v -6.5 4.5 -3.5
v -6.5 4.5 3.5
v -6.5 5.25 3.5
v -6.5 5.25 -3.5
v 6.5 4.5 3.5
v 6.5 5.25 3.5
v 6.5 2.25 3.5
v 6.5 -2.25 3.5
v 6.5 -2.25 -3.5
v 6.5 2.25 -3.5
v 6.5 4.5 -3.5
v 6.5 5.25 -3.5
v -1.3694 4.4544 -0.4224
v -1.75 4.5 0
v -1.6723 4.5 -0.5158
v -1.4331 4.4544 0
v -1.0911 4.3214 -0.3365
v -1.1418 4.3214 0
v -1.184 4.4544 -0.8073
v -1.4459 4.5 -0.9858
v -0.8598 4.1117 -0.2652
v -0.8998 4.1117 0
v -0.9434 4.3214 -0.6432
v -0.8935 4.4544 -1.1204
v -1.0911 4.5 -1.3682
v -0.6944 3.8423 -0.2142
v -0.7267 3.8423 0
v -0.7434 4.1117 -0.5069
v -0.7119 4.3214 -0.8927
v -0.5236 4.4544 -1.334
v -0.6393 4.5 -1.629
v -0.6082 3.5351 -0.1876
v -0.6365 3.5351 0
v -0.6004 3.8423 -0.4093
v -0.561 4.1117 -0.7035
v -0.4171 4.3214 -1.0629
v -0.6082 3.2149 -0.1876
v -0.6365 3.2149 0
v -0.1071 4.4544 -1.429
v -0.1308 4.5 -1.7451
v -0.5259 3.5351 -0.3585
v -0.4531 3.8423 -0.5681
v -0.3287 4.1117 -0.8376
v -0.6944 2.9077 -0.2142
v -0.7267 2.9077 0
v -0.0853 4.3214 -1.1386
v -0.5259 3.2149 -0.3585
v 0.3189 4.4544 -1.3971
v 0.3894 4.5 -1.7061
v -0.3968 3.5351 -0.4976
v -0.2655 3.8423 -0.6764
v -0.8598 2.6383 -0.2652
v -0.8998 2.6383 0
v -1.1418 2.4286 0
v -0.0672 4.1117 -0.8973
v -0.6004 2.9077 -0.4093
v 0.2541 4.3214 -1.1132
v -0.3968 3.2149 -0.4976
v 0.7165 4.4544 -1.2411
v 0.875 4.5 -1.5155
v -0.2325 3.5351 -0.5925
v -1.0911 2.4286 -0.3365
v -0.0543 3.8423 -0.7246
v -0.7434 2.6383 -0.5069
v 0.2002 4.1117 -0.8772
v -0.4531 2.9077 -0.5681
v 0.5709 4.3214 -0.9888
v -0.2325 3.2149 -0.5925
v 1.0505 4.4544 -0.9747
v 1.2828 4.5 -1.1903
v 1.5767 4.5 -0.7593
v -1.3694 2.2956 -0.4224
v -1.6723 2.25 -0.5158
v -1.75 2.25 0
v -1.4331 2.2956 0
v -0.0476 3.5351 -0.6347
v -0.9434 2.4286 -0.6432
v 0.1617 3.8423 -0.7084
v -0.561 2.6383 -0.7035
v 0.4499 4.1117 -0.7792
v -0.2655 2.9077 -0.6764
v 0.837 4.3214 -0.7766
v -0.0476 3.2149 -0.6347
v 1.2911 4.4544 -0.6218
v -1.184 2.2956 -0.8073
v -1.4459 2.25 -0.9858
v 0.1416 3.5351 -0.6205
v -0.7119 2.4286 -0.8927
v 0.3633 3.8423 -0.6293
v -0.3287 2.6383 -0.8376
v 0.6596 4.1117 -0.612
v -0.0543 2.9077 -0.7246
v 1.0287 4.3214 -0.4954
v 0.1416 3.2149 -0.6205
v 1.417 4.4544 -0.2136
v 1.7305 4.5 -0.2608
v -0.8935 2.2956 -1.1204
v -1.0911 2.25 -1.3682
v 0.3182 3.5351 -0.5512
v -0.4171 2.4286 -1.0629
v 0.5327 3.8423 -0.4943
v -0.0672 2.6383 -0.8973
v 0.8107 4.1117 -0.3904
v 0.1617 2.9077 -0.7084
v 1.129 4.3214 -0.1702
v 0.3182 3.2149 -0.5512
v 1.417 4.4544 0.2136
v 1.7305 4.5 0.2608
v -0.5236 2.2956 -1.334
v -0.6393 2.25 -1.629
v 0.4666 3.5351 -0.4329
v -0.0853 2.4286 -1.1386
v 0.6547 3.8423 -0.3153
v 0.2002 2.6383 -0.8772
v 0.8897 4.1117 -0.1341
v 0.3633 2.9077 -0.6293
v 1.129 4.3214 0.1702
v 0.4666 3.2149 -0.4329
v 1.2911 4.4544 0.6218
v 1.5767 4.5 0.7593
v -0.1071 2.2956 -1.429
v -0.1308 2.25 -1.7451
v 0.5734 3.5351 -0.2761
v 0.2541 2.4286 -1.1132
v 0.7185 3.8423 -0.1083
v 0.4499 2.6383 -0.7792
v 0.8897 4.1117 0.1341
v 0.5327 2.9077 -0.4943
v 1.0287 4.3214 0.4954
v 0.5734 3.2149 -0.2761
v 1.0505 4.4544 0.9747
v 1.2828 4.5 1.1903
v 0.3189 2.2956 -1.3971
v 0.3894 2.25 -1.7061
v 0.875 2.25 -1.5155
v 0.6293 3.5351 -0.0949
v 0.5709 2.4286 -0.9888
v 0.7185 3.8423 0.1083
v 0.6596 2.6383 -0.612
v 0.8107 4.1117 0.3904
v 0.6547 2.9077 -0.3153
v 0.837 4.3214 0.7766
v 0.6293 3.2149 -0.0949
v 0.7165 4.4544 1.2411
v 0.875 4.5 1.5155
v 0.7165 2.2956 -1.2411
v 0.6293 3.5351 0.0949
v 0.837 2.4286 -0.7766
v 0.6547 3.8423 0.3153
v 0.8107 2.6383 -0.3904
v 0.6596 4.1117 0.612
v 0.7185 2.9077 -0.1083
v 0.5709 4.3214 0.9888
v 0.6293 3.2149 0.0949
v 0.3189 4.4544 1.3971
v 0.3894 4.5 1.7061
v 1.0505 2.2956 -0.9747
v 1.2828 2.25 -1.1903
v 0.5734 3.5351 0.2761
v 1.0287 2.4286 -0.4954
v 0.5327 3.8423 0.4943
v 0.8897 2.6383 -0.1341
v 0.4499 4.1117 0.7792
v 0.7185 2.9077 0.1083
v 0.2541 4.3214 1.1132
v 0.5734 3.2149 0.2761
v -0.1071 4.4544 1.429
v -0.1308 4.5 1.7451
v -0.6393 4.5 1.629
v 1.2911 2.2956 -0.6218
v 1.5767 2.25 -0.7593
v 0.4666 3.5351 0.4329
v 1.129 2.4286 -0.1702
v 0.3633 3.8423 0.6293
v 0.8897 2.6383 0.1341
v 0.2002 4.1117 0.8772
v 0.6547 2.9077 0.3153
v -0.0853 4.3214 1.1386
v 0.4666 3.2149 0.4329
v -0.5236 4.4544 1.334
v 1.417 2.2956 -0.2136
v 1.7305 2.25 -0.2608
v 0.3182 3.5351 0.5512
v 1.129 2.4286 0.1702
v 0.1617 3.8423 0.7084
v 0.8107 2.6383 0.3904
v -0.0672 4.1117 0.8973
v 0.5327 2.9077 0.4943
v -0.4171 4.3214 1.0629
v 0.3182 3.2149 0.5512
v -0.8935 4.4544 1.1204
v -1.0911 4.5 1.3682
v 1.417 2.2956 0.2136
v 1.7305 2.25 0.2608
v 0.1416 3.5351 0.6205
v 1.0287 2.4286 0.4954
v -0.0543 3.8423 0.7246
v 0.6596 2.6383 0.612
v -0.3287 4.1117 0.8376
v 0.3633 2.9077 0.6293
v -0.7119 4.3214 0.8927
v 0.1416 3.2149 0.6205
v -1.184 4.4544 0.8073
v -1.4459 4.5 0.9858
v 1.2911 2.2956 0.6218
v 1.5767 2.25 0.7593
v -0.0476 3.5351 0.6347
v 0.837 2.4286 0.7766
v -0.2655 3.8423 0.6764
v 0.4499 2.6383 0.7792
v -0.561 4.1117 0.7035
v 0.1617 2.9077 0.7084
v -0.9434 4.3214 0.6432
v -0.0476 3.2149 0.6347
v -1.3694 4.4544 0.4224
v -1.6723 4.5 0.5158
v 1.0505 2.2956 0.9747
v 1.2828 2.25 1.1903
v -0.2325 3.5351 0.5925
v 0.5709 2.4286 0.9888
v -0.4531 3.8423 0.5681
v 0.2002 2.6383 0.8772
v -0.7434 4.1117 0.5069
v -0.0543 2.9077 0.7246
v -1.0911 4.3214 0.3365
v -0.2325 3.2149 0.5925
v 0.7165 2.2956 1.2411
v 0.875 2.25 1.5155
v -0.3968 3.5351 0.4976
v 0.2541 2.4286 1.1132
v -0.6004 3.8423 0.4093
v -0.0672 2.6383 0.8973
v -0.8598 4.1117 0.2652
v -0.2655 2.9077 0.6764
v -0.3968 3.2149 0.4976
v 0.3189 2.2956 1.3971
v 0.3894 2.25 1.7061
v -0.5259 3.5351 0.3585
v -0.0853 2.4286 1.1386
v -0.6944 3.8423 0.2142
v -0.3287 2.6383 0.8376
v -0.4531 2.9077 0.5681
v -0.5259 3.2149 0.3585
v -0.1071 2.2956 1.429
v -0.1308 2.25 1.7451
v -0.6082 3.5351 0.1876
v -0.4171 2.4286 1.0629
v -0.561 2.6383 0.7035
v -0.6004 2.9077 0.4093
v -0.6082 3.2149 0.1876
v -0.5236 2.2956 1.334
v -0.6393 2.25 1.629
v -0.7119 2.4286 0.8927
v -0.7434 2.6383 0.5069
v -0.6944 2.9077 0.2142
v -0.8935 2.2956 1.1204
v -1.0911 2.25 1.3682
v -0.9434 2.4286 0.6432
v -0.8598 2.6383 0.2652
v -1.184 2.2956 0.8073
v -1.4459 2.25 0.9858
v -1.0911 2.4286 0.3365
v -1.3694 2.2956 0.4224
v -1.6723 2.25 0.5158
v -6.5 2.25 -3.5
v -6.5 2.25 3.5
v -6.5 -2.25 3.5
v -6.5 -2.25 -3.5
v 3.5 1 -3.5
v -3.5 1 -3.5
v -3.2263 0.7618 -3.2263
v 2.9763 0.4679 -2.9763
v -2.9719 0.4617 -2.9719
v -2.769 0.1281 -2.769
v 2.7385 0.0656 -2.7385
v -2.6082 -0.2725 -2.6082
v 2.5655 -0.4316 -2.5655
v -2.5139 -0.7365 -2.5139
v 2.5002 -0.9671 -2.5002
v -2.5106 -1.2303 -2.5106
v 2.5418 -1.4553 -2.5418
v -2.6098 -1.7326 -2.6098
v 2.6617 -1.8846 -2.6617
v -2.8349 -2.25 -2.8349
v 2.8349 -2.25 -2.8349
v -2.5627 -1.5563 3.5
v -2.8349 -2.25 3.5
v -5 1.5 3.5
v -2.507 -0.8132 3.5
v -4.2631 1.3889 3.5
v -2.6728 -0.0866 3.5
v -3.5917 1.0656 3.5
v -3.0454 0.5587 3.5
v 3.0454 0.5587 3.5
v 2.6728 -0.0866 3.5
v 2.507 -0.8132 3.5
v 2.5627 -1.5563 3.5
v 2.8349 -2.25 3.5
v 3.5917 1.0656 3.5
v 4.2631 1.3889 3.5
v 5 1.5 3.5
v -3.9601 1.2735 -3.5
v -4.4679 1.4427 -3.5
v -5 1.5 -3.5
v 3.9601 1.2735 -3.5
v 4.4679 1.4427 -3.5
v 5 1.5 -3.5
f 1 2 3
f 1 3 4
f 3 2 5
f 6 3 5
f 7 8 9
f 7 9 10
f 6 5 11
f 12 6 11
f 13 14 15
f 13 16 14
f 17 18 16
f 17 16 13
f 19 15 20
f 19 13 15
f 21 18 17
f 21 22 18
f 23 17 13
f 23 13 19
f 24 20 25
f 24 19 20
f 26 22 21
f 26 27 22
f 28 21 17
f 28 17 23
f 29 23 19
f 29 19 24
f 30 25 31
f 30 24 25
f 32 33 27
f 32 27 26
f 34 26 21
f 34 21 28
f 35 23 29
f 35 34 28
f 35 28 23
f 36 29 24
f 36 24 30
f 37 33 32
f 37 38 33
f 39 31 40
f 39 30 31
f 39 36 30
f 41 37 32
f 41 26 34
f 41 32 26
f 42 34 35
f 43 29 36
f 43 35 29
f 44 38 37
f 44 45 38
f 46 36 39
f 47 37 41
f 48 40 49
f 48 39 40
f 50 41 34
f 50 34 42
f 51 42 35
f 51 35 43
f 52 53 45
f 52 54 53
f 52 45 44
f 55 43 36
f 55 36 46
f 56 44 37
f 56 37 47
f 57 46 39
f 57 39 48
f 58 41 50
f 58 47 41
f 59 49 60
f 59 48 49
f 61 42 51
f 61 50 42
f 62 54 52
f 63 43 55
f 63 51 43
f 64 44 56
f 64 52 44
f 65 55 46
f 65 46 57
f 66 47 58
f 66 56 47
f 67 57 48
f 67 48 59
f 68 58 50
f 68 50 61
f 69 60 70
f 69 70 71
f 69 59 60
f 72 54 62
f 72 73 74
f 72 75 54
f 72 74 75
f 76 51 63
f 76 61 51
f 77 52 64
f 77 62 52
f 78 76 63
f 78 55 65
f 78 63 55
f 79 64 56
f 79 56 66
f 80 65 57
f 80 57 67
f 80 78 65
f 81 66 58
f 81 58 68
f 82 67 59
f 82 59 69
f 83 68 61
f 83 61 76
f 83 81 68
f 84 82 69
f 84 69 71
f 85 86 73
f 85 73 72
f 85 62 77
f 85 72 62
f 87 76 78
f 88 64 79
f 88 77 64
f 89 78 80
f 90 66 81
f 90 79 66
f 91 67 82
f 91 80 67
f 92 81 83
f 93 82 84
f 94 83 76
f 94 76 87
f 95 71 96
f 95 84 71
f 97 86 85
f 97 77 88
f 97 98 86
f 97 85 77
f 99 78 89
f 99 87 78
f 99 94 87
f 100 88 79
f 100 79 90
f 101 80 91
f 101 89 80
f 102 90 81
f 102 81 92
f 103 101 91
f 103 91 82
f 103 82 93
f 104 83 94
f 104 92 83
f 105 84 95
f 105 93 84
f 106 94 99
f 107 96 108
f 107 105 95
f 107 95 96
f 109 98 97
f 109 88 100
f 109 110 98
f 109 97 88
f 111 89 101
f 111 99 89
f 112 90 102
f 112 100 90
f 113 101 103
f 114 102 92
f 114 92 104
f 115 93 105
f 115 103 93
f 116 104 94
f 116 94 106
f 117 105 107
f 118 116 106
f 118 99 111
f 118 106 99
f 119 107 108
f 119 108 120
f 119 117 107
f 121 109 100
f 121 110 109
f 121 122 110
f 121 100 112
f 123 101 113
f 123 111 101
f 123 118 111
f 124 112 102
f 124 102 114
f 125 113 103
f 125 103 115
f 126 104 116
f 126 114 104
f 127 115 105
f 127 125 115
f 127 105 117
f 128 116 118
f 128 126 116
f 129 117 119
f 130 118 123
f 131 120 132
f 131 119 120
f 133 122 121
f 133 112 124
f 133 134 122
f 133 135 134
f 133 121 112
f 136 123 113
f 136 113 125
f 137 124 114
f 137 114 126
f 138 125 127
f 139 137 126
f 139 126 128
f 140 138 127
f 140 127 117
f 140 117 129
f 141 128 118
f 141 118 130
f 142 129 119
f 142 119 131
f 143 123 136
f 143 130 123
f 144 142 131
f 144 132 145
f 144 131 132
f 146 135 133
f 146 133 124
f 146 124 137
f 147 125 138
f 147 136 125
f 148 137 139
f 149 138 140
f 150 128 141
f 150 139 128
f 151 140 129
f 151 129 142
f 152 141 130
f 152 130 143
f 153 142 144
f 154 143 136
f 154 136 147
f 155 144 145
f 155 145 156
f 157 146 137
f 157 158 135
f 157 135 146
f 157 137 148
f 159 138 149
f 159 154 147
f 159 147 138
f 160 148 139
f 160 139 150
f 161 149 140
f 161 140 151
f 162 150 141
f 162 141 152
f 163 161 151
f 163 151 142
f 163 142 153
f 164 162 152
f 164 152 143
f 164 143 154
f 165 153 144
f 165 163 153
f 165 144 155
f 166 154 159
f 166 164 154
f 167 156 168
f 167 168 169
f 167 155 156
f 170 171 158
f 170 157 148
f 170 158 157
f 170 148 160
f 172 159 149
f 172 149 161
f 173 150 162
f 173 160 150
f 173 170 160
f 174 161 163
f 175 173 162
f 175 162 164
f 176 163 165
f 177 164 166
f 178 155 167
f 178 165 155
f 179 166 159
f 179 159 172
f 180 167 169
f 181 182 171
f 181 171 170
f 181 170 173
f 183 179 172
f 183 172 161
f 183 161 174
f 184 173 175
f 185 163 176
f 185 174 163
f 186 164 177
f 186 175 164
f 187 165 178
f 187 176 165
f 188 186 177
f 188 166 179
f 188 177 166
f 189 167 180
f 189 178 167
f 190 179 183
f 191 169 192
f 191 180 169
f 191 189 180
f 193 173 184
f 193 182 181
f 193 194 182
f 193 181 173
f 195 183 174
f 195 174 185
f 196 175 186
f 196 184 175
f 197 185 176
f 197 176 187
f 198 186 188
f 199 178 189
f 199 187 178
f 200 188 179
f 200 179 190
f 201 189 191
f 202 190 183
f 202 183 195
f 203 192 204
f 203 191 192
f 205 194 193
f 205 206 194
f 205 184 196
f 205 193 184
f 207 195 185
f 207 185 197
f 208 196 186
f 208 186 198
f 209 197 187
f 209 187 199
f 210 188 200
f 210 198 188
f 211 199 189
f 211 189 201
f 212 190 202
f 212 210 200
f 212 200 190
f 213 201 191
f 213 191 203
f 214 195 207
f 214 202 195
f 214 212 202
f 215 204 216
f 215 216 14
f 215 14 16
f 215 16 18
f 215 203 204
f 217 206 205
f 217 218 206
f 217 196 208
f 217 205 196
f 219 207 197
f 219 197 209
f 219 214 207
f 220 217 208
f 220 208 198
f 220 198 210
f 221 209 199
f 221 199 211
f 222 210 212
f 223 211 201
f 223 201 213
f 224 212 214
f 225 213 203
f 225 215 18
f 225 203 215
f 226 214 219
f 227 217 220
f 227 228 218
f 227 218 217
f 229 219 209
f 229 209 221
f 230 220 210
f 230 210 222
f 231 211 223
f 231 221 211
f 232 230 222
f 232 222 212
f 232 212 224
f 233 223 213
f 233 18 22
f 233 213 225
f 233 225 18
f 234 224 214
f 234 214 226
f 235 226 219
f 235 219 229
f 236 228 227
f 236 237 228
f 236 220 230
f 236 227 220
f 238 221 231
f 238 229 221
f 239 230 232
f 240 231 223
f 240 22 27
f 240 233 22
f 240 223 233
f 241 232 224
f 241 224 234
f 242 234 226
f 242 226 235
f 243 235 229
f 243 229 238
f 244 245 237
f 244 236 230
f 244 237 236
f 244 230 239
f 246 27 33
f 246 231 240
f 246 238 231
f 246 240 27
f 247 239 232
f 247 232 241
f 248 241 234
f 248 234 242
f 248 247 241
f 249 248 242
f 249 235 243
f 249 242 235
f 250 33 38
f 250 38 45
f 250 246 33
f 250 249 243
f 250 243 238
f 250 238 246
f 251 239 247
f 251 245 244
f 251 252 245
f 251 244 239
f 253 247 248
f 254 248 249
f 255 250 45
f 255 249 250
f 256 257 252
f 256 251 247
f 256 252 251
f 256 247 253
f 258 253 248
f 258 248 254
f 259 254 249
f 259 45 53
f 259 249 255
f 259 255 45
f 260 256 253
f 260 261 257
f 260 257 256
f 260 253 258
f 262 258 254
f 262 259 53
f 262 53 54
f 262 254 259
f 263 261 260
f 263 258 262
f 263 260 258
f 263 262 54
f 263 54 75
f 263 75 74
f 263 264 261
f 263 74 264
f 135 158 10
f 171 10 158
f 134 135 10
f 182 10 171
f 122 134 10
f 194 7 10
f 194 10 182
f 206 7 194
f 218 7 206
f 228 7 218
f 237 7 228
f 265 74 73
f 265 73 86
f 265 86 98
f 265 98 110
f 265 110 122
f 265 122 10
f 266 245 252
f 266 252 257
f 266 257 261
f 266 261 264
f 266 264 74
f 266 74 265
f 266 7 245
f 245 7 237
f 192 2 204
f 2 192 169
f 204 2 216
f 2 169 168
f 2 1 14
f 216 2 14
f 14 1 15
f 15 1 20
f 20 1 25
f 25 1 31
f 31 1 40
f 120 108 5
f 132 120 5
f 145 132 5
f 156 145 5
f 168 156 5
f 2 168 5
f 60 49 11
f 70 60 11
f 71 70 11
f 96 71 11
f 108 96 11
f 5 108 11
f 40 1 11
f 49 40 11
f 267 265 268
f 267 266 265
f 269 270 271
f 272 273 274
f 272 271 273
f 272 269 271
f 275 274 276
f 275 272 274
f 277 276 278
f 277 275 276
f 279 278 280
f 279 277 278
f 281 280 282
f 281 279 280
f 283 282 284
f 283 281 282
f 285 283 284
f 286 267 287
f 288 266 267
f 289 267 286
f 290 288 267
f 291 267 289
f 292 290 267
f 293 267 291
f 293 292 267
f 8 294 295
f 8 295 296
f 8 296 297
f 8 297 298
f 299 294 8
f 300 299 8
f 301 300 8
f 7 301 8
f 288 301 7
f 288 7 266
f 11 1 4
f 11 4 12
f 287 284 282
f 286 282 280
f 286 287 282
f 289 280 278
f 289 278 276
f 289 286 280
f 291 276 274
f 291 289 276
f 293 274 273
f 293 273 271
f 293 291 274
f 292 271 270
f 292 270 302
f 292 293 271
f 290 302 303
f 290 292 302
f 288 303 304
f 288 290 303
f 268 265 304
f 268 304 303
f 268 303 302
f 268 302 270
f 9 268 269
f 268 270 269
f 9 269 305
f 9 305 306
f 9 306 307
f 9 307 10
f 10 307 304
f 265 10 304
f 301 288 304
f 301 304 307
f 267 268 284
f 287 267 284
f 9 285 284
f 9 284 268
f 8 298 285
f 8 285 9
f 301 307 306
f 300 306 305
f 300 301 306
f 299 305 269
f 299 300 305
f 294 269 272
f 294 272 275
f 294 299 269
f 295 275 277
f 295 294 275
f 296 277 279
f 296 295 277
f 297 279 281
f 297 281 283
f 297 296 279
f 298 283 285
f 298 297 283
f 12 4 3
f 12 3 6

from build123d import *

# Parameters (mm, degrees)
BOSS_EXTRUDE1_DEPTH = 3.5
BOSS_EXTRUDE2_DEPTH = 3.5
SKETCH4_W           = 13
SKETCH4_H           = 7
BOSS_EXTRUDE3_DEPTH = 0.75


with BuildPart() as part:
    # Sketch1 → Boss-Extrude1 (new body, symmetric)
    with BuildSketch(Plane.XY):
        with BuildLine():
            ThreePointArc((-2.834936491, -2.25), (-2.834936491, 0.25), (-5, 1.5))
            Line((-5, 1.5), (5, 1.5))
            ThreePointArc((5, 1.5), (2.834936491, 0.25), (2.834936491, -2.25))
            Line((2.834936491, -2.25), (6.5, -2.25))
            Line((6.5, -2.25), (6.5, 2.25))
            Line((6.5, 2.25), (-6.5, 2.25))
            Line((-6.5, 2.25), (-6.5, -2.25))
            Line((-6.5, -2.25), (-2.834936491, -2.25))
        make_face()
    extrude(amount=BOSS_EXTRUDE1_DEPTH, both=True)

    # Sketch2 → Boss-Extrude2 (add, symmetric)
    with BuildSketch(Plane(origin=(0, 0, 0), x_dir=(0, 0, -1), z_dir=(1, 0, 0))):
        with BuildLine():
            Line((3.5, -2.25), (3.5, 1))
            ThreePointArc((3.5, 1), (2.550755702, -0.498799074), (2.834936491, -2.25))
            Line((2.834936491, -2.25), (3.5, -2.25))
        make_face()
    extrude(amount=BOSS_EXTRUDE2_DEPTH, both=True)

    # Sketch3 → Revolve1 (revolve)
    with BuildSketch(Plane.XY):
        with BuildLine():
            Line((0, 4.5), (-1.75, 4.5))
            ThreePointArc((-1.75, 4.5), (-0.625, 3.375), (-1.75, 2.25))
            Line((-1.75, 2.25), (0, 2.25))
            Line((0, 2.25), (0, 4.5))
        make_face()
    revolve(axis=Axis((0, 5.875, 0), (0, -1, 0)))

    # Sketch4 → Boss-Extrude3 (add)
    with BuildSketch(Plane(origin=(0, 4.5, 0), x_dir=(1, 0, 0), z_dir=(0, 1, 0))):
        Rectangle(SKETCH4_W, SKETCH4_H)
    extrude(amount=BOSS_EXTRUDE3_DEPTH)


solid = part.part
